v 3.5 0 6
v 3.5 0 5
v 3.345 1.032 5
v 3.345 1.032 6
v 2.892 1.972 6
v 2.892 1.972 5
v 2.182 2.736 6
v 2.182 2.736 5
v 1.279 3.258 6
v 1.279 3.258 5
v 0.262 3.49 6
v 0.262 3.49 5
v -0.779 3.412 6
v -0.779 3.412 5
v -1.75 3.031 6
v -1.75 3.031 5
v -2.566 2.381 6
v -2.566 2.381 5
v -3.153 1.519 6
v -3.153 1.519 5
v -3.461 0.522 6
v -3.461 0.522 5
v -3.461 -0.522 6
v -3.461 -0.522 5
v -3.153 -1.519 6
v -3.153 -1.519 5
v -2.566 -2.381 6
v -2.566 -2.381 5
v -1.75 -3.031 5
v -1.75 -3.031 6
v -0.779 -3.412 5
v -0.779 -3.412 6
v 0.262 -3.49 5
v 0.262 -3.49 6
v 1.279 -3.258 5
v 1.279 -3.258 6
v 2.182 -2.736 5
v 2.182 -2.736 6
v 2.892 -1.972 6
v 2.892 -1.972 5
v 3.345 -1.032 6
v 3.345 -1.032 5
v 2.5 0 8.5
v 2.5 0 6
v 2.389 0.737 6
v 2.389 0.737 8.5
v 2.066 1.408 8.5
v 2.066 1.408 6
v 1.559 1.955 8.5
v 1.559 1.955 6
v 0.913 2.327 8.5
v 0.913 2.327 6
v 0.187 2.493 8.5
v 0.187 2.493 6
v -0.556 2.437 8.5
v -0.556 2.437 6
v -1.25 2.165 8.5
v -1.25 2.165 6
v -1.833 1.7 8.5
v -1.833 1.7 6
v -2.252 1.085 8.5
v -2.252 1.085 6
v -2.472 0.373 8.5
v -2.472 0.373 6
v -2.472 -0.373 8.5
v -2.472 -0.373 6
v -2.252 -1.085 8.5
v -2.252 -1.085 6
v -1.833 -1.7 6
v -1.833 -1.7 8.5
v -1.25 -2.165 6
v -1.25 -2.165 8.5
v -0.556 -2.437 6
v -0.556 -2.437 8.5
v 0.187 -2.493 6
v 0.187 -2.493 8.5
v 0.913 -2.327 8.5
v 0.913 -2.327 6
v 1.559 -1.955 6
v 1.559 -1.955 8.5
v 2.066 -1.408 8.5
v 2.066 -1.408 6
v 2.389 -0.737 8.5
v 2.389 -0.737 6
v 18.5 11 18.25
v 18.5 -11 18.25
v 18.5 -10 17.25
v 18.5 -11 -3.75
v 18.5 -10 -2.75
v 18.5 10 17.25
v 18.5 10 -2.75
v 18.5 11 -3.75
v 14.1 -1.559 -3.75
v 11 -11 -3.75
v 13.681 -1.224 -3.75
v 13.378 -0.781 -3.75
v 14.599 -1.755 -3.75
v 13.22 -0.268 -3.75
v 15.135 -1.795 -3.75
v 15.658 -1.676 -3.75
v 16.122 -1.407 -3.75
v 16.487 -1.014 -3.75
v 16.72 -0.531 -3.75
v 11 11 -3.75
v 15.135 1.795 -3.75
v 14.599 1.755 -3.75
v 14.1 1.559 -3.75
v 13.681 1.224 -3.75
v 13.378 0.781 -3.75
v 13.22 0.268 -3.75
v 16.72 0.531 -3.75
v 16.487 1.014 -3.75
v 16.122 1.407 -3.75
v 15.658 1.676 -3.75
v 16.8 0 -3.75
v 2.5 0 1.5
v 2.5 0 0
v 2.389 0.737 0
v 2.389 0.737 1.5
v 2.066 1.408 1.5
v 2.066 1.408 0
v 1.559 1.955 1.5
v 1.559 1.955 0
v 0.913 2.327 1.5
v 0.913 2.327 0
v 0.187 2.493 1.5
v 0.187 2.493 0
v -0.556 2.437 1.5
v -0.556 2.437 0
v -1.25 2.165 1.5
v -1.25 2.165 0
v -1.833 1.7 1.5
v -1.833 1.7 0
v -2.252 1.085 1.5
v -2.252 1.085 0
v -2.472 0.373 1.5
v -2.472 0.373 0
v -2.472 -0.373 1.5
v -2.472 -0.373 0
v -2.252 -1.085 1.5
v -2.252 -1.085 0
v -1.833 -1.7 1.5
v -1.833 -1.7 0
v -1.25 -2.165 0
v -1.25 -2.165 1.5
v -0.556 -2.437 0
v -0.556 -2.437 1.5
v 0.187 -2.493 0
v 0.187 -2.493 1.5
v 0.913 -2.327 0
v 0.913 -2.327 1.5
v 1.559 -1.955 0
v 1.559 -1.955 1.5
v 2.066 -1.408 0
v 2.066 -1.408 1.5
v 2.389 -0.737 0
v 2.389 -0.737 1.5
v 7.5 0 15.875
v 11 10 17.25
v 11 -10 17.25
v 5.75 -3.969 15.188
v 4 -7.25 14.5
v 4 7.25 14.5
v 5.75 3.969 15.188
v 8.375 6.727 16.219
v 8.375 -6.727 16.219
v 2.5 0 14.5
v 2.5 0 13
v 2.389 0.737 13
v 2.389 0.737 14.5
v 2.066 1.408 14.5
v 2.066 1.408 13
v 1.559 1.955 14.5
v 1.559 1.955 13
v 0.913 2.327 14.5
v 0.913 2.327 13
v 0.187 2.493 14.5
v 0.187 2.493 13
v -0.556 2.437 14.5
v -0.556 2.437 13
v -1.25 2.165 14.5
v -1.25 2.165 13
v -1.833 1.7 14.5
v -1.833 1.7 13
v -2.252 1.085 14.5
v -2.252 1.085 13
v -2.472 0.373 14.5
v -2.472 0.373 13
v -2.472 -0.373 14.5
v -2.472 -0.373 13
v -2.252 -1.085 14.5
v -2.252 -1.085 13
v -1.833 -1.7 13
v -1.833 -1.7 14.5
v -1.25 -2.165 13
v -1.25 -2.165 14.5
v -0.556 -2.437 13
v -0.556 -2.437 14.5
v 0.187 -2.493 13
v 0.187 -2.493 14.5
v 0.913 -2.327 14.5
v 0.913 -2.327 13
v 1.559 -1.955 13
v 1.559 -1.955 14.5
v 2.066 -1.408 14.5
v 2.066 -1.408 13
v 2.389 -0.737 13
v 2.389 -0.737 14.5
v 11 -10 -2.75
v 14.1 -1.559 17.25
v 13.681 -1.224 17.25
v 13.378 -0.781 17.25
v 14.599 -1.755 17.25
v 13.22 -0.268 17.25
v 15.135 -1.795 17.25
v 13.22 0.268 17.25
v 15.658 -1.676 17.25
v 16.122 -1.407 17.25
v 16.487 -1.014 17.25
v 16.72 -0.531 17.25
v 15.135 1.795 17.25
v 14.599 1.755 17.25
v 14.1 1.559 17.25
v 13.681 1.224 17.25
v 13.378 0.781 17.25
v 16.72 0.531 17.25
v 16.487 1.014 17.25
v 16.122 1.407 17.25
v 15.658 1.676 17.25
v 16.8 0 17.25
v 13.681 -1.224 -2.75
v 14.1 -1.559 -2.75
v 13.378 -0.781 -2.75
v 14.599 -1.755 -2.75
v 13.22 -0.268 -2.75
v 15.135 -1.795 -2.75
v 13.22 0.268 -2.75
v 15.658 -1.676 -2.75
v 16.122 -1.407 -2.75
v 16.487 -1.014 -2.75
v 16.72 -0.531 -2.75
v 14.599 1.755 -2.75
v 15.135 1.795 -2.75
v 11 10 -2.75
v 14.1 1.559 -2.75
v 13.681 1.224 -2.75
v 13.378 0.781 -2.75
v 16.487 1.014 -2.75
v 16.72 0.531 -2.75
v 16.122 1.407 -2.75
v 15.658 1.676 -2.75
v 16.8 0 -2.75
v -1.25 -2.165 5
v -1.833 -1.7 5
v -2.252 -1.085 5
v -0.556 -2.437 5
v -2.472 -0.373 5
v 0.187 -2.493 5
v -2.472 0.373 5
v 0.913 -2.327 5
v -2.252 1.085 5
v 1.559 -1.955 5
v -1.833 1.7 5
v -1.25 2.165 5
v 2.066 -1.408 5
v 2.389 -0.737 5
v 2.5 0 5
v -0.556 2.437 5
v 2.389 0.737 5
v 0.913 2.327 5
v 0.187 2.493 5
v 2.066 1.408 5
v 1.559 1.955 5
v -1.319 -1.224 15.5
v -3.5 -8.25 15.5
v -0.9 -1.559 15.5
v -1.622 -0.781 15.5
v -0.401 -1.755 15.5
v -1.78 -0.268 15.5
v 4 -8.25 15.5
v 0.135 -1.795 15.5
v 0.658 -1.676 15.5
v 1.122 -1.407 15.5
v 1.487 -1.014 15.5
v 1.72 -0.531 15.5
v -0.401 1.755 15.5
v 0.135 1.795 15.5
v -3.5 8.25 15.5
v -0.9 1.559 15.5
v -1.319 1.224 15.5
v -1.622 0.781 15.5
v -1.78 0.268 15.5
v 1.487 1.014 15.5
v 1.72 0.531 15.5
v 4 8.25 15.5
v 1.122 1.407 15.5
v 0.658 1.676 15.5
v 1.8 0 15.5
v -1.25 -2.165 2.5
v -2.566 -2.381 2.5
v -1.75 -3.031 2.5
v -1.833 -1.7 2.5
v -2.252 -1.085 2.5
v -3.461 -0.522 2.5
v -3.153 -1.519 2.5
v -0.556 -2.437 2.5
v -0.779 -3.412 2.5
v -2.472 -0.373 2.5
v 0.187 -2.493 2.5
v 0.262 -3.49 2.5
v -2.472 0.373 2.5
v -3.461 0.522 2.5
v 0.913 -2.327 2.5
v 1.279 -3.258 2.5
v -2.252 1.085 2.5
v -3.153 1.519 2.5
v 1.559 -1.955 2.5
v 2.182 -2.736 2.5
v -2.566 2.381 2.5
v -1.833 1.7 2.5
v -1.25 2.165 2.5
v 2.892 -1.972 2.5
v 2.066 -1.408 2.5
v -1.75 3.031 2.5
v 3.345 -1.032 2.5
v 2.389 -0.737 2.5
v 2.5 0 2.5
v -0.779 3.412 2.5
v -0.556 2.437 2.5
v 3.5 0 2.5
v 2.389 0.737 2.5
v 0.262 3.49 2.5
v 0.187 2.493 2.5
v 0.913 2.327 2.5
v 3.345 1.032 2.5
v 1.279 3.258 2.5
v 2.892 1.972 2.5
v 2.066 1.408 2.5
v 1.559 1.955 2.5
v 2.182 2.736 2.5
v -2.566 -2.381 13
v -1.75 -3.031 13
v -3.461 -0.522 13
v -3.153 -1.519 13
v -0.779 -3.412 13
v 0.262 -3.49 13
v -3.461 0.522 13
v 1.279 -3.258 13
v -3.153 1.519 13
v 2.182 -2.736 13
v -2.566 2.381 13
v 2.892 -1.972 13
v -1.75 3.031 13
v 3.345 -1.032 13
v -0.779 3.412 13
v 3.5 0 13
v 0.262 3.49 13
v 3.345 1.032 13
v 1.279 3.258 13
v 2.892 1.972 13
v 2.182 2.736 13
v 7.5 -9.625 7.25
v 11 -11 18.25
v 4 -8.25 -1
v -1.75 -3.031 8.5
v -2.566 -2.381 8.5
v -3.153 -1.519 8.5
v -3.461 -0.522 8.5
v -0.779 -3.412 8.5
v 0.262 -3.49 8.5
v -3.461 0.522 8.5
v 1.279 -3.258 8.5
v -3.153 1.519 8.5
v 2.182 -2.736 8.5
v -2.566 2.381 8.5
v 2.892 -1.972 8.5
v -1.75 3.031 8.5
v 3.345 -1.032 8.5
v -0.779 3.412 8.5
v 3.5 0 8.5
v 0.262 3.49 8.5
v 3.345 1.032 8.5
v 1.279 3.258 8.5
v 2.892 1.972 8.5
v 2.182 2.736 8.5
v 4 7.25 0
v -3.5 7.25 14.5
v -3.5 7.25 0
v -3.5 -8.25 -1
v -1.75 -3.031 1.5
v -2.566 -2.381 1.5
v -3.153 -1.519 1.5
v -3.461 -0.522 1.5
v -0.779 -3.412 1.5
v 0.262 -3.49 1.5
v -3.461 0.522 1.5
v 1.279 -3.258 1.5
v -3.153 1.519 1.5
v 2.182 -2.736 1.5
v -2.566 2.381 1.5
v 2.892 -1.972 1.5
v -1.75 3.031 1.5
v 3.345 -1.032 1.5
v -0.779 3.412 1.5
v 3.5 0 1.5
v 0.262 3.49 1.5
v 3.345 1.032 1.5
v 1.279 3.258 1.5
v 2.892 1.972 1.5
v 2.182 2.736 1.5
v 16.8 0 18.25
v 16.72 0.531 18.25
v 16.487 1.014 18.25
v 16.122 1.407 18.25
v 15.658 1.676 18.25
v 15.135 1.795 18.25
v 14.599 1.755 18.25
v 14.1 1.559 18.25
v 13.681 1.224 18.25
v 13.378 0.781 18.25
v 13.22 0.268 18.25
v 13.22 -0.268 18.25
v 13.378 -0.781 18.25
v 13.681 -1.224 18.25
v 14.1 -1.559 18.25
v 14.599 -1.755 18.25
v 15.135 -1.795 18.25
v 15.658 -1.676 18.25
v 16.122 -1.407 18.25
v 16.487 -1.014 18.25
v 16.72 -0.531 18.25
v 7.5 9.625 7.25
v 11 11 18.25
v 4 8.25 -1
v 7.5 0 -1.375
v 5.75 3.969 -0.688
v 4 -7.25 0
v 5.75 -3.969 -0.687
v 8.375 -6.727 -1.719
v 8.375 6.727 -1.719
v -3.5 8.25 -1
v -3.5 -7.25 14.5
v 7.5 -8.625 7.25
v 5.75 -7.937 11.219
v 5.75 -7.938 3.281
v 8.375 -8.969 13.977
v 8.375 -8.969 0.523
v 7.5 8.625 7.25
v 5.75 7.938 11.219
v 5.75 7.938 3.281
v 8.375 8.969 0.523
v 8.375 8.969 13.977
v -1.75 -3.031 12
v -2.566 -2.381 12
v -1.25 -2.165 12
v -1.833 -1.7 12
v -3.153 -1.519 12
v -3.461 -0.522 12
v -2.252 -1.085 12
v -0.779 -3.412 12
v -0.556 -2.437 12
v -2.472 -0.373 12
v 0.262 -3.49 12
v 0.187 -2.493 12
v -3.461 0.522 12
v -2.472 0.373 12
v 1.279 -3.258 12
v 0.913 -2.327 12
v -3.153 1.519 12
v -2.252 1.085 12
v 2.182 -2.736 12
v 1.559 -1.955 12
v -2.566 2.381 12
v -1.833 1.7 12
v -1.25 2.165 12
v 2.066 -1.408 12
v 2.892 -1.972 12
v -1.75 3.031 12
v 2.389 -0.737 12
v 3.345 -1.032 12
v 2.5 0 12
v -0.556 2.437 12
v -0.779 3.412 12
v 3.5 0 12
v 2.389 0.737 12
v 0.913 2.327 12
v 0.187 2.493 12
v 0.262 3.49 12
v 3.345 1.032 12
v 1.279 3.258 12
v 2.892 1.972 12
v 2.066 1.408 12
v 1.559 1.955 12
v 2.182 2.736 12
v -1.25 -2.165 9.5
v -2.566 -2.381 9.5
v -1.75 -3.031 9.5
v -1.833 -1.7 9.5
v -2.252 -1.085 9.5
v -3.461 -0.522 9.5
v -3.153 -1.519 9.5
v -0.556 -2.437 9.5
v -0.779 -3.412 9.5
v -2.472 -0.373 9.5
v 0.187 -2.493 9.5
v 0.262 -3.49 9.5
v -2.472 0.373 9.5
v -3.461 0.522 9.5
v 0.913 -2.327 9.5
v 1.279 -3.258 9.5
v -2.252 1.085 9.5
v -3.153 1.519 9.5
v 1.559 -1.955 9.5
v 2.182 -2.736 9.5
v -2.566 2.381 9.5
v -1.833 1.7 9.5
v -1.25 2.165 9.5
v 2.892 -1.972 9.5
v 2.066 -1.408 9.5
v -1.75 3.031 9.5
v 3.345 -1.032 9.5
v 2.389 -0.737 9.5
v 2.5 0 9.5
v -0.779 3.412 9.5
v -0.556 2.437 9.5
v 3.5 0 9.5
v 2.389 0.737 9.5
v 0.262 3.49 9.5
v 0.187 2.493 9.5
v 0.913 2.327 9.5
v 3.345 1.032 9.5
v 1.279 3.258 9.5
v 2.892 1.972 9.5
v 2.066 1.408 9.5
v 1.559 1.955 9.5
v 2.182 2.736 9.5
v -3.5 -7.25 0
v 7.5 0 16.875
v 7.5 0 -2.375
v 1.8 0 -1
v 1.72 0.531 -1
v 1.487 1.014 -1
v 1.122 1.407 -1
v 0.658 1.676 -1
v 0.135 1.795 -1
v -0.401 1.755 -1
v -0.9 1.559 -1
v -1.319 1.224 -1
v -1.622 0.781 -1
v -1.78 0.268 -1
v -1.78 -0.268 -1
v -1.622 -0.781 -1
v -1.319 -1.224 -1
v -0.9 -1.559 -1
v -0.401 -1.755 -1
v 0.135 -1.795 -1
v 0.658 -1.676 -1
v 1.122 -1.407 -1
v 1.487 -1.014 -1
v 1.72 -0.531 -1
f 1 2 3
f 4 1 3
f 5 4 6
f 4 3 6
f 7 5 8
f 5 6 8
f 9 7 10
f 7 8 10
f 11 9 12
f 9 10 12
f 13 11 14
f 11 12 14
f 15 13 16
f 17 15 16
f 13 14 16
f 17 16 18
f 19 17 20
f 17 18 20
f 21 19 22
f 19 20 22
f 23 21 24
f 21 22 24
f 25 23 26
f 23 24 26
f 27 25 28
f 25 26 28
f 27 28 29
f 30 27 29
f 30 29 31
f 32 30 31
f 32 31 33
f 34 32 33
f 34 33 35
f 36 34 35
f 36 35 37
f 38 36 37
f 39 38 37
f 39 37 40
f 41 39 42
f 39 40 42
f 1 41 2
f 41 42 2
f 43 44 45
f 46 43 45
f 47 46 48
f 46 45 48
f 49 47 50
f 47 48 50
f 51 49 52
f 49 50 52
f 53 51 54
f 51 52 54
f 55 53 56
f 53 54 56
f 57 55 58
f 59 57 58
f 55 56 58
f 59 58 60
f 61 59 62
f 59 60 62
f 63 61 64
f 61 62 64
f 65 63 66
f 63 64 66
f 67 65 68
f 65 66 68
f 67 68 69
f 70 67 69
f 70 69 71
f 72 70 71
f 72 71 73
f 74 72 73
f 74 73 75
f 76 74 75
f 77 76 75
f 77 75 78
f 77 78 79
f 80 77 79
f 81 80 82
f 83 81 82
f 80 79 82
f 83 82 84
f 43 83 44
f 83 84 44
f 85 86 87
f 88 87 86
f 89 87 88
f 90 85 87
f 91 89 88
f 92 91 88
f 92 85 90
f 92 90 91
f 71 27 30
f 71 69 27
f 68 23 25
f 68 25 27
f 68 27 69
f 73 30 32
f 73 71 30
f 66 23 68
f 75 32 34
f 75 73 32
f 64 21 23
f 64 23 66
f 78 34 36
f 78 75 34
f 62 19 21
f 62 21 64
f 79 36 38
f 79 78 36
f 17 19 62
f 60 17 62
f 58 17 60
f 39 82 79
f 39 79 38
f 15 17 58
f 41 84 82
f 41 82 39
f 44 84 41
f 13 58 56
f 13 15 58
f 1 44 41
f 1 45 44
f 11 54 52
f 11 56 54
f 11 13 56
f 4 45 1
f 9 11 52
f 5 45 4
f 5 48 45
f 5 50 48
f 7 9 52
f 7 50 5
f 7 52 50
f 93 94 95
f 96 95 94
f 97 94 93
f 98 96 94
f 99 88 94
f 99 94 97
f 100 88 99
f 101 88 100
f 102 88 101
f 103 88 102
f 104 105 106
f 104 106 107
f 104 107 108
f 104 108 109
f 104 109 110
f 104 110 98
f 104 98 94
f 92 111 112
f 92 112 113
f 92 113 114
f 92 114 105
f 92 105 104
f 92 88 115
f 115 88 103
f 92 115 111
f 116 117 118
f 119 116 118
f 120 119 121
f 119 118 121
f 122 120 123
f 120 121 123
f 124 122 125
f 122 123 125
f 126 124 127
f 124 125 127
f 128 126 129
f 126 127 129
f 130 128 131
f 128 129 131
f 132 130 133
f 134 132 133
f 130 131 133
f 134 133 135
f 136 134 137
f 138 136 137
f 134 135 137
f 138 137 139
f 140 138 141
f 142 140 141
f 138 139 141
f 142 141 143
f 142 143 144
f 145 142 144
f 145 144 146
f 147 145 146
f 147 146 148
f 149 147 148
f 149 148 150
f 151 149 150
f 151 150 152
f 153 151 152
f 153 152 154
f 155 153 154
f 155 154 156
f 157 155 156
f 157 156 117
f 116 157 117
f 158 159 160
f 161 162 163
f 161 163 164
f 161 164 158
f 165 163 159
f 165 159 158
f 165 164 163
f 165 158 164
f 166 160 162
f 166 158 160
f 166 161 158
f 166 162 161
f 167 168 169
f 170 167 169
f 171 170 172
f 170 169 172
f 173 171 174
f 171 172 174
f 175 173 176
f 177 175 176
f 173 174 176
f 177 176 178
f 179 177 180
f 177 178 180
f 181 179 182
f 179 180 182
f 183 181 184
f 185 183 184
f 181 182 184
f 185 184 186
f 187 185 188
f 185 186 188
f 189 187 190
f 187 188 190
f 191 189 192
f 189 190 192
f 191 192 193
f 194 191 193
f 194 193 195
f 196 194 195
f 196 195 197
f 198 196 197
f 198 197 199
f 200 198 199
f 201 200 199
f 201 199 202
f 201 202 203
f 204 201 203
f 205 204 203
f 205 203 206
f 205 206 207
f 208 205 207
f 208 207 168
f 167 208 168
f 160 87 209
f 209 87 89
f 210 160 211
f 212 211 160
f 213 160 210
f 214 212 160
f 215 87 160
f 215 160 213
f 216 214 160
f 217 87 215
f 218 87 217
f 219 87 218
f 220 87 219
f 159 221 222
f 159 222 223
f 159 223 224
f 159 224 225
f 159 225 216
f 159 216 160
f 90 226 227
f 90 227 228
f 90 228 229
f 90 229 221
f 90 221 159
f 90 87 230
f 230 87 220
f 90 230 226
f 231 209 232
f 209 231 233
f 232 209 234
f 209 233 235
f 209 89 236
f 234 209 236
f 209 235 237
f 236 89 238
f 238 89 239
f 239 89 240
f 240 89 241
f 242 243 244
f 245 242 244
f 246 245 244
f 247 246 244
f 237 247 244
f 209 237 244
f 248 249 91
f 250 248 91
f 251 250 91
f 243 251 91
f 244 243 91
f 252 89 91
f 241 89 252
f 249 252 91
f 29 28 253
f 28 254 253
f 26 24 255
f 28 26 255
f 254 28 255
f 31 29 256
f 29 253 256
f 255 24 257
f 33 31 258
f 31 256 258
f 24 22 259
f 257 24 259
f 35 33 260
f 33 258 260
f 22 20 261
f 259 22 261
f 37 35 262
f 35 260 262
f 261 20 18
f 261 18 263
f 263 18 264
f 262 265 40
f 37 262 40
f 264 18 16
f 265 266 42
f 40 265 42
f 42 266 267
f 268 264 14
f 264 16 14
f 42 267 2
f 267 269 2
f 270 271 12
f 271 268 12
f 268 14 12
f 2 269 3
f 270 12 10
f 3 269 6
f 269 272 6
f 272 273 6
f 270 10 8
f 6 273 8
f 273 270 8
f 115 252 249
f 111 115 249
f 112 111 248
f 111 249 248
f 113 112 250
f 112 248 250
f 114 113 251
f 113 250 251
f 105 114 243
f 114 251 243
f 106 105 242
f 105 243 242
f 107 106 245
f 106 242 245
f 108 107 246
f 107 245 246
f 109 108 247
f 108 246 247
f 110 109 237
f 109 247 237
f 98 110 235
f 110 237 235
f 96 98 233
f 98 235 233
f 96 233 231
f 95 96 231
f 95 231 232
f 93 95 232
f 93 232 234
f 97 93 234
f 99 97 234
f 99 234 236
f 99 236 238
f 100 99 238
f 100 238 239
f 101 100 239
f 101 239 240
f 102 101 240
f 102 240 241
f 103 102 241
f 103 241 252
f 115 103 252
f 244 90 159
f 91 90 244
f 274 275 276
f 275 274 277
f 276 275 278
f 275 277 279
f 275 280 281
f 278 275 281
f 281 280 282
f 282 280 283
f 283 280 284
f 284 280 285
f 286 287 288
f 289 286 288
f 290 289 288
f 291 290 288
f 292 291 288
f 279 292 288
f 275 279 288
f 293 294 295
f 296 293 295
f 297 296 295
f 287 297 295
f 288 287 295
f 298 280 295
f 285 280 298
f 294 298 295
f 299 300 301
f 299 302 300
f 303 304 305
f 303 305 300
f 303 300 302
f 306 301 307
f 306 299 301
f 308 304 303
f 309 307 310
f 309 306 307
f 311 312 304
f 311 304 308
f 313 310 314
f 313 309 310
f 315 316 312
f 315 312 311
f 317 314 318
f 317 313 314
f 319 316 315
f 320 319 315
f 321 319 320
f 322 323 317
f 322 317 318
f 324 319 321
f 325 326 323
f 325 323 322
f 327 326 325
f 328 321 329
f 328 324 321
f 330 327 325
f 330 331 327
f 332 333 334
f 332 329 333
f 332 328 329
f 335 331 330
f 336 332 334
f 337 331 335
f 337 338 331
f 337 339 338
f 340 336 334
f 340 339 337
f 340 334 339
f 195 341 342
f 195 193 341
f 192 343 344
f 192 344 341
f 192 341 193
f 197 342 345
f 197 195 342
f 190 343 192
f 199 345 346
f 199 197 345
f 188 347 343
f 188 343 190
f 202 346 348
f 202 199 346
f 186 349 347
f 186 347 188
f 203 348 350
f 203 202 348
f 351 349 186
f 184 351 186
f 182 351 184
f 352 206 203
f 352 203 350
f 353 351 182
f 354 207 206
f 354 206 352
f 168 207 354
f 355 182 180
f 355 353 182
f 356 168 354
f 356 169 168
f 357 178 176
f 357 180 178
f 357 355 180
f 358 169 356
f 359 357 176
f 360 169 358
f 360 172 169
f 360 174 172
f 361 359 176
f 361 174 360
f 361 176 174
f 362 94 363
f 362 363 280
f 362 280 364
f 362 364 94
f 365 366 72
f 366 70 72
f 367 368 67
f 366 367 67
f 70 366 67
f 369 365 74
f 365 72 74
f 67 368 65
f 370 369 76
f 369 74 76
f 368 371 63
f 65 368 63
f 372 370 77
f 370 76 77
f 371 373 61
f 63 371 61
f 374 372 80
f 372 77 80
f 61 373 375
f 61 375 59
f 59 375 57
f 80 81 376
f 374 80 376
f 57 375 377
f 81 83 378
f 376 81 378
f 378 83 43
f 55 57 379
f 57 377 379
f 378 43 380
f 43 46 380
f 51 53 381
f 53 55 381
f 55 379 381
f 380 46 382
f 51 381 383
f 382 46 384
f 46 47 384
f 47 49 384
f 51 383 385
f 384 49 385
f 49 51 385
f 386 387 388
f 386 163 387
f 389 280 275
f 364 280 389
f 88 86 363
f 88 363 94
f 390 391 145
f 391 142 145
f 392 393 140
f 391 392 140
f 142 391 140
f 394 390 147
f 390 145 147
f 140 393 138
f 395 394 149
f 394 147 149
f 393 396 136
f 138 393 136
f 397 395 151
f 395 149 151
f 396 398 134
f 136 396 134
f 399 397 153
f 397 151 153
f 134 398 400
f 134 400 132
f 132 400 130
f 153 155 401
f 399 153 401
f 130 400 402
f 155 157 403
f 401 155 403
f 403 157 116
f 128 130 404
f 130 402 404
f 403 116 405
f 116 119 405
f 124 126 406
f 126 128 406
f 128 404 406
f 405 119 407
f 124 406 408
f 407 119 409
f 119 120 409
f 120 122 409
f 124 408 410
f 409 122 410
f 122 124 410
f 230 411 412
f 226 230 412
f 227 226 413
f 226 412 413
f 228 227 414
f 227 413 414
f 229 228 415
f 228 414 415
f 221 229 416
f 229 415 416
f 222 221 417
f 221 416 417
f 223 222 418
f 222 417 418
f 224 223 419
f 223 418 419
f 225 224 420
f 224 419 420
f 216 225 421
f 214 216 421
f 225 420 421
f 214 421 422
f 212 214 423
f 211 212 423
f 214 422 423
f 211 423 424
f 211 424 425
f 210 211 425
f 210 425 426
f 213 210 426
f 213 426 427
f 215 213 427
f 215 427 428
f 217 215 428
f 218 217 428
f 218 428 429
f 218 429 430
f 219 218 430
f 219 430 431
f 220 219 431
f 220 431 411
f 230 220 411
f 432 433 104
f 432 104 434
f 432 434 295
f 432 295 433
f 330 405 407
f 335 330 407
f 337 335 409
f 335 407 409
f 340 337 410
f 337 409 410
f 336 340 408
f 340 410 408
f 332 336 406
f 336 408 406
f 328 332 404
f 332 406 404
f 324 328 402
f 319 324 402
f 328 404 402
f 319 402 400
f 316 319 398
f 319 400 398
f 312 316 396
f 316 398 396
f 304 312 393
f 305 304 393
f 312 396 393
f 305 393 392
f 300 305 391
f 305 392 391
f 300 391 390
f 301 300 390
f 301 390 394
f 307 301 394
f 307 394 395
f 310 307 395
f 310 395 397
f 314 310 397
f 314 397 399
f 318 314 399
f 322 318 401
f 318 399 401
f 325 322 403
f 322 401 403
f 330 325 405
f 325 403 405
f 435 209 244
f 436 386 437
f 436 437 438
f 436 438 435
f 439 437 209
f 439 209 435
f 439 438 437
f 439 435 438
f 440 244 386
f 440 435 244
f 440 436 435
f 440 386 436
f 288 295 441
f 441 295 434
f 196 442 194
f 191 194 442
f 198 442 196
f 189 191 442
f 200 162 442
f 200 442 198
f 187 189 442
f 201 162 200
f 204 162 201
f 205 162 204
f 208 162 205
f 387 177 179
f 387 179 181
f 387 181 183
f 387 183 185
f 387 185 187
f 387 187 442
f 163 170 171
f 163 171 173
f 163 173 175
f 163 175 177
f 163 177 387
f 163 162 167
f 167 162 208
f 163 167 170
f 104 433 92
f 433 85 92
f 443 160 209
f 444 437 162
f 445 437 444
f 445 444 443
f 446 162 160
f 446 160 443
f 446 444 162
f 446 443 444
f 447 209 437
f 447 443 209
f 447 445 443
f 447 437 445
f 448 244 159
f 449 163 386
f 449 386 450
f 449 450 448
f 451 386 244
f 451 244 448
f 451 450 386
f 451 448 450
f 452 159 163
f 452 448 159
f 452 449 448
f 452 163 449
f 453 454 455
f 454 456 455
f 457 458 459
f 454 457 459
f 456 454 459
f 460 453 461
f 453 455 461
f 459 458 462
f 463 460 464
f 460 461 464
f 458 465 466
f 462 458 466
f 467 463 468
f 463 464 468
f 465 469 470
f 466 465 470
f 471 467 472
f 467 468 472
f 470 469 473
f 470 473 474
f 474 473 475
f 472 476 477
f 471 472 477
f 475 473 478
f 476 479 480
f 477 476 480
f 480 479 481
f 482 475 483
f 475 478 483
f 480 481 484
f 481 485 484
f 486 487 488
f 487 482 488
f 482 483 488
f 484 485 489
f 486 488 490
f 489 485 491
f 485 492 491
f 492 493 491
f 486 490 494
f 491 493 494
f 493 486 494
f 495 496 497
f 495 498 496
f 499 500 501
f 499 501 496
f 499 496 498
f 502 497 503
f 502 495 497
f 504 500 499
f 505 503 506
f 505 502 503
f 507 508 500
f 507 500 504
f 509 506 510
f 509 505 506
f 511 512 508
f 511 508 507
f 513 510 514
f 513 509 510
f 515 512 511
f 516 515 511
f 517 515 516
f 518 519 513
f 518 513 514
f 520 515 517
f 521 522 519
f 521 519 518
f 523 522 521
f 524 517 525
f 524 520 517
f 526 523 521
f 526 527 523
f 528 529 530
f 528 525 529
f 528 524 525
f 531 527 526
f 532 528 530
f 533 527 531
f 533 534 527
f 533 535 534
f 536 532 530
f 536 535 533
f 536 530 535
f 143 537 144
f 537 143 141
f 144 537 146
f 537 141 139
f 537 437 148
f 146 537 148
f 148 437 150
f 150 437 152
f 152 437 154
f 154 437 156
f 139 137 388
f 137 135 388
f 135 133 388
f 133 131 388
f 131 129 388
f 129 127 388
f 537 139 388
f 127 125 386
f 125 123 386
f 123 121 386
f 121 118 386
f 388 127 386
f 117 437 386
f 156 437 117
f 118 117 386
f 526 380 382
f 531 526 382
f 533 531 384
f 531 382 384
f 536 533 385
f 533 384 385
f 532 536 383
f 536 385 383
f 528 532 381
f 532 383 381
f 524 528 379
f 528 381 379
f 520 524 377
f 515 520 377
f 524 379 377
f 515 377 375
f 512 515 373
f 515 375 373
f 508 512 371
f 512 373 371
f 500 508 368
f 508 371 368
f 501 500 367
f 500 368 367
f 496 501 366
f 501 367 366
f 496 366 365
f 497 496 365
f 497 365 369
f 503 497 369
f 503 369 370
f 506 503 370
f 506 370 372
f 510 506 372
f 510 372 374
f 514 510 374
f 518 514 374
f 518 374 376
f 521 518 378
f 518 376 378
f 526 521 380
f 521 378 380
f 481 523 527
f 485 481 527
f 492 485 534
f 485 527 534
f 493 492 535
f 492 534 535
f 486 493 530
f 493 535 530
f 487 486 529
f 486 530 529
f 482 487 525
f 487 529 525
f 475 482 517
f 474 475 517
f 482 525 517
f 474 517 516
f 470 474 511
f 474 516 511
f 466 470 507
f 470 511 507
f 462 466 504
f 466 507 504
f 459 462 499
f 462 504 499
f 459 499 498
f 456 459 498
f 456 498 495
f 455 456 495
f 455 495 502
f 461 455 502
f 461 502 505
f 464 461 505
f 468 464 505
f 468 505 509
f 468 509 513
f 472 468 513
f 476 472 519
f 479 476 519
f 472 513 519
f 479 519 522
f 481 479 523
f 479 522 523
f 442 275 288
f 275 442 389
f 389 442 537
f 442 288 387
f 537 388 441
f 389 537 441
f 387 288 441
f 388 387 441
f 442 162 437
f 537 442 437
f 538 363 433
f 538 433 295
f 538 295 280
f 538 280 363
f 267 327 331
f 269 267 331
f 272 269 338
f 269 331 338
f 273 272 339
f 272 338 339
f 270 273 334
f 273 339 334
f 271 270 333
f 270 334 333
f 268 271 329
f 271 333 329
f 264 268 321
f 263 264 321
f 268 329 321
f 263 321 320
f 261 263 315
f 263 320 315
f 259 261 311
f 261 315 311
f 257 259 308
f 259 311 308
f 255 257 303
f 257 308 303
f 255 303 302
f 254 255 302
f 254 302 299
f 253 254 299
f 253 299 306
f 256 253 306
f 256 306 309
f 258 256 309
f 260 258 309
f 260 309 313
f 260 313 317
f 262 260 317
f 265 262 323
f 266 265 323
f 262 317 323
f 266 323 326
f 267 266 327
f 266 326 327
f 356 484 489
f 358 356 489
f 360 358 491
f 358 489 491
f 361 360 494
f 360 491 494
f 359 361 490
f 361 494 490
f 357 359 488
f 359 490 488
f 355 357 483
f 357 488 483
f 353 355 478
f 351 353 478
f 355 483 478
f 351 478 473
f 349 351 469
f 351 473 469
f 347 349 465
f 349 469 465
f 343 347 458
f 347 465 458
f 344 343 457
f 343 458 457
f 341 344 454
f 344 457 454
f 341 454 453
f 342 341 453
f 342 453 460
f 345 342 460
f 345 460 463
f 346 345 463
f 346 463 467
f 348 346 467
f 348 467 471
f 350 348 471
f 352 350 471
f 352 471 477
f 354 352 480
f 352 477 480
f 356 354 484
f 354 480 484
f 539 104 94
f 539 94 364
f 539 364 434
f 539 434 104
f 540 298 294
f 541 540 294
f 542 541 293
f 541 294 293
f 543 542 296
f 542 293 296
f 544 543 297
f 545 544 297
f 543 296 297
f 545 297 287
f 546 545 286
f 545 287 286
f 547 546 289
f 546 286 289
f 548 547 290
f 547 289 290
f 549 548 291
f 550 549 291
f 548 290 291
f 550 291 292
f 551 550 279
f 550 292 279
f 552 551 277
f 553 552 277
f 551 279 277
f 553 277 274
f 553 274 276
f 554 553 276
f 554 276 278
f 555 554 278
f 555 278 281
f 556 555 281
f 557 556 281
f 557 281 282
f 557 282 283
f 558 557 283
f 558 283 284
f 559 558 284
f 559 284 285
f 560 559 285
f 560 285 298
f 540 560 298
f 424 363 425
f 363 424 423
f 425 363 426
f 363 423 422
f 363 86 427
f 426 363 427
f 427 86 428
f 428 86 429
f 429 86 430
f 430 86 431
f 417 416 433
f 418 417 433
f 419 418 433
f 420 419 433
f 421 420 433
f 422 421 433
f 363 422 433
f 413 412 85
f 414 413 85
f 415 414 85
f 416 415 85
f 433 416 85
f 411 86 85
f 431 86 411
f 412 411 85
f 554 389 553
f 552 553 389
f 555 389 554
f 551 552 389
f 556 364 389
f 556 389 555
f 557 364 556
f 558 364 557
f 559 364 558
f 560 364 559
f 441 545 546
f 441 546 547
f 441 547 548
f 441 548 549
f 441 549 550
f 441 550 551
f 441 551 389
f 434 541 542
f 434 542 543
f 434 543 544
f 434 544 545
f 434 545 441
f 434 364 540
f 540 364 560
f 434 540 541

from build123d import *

# Parameters (mm, degrees)
SKETCH_1_R               = 2.5
EXTRUDE_1_DEPTH          = 1.5
SKETCH_2_R               = 3.5
EXTRUDE_2_DEPTH          = 1
SKETCH_3_R               = 2.5
EXTRUDE_3_DEPTH          = 2.5
SKETCH_4_R               = 3.5
EXTRUDE_4_DEPTH          = 1
SKETCH_5_R               = 2.5
EXTRUDE_5_DEPTH          = 2.5
SKETCH_6_R               = 3.5
EXTRUDE_6_DEPTH          = 1
SKETCH_7_R               = 2.5
EXTRUDE_7_DEPTH          = 2.5
SKETCH_10_R              = 3.5
EXTRUDE_9_DEPTH          = 1
SKETCH_11_R              = 2.5
EXTRUDE_10_DEPTH         = 1.5
SKETCH_12_R              = 1.8
CUT_EXTRUDE_2_DEPTH      = 15.5
SKETCH_13_W              = 22
SKETCH_13_H              = 22
SKETCH_13_W_2            = 20
SKETCH_13_H_2            = 20
EXTRUDE_11_DEPTH         = 3.5
EXTRUDE_11_DEPTH_BACK    = 4
SKETCH_14_W              = 16.5
SKETCH_14_H              = 16.5
SKETCH_14_W_2            = 14.5
SKETCH_14_H_2            = 14.5
EXTRUDE_12_DEPTH         = 4
EXTRUDE_12_DEPTH_BACK    = 3.5
PATTERN_CIRCULAR_1_COUNT = 4
SKETCH_19_R              = 1.8
CUT_EXTRUDE_3_DEPTH      = 20.2500001
SKETCH_20_R              = 1.8
CUT_EXTRUDE_4_DEPTH      = 23.0000001


with BuildPart() as part:
    # ｽｹｯﾁ1 → ﾎﾞｽ - 押し出し1 (new body)
    with BuildSketch(Plane.XY):
        Circle(SKETCH_1_R)
    extrude(amount=EXTRUDE_1_DEPTH)

    # ｽｹｯﾁ2 → ﾎﾞｽ - 押し出し2 (add)
    with BuildSketch(Plane.XY.offset(1.5)):
        Circle(SKETCH_2_R)
    extrude(amount=EXTRUDE_2_DEPTH)

    # ｽｹｯﾁ3 → ﾎﾞｽ - 押し出し3 (add)
    with BuildSketch(Plane.XY.offset(2.5)):
        Circle(SKETCH_3_R)
    extrude(amount=EXTRUDE_3_DEPTH)

    # ｽｹｯﾁ4 → ﾎﾞｽ - 押し出し4 (add)
    with BuildSketch(Plane.XY.offset(5)):
        Circle(SKETCH_4_R)
    extrude(amount=EXTRUDE_4_DEPTH)

    # ｽｹｯﾁ5 → ﾎﾞｽ - 押し出し5 (add)
    with BuildSketch(Plane.XY.offset(6)):
        Circle(SKETCH_5_R)
    extrude(amount=EXTRUDE_5_DEPTH)

    # ｽｹｯﾁ6 → ﾎﾞｽ - 押し出し6 (add)
    with BuildSketch(Plane.XY.offset(8.5)):
        Circle(SKETCH_6_R)
    extrude(amount=EXTRUDE_6_DEPTH)

    # ｽｹｯﾁ7 → ﾎﾞｽ - 押し出し7 (add)
    with BuildSketch(Plane.XY.offset(9.5)):
        Circle(SKETCH_7_R)
    extrude(amount=EXTRUDE_7_DEPTH)

    # ｽｹｯﾁ10 → ﾎﾞｽ - 押し出し9 (add)
    with BuildSketch(Plane.XY.offset(12)):
        Circle(SKETCH_10_R)
    extrude(amount=EXTRUDE_9_DEPTH)

    # ｽｹｯﾁ11 → ﾎﾞｽ - 押し出し10 (add)
    with BuildSketch(Plane.XY.offset(13)):
        Circle(SKETCH_11_R)
    extrude(amount=EXTRUDE_10_DEPTH)

    # ｽｹｯﾁ12 → ｶｯﾄ - 押し出し2 (cut, through all)
    with BuildSketch(Plane.XY.offset(14.5)):
        Circle(SKETCH_12_R)
    extrude(amount=-CUT_EXTRUDE_2_DEPTH, mode=Mode.SUBTRACT)

    # ｽｹｯﾁ14 → ﾎﾞｽ - 押し出し12 (add, two sides)
    with BuildSketch(Plane(origin=(0, 0, 0), x_dir=(0, 0, -1), z_dir=(1, 0, 0))) as extrude_12_sk:
        with Locations((-7.25, 0)):
            Rectangle(SKETCH_14_W, SKETCH_14_H)
        with Locations((-7.25, 0)):
            Rectangle(SKETCH_14_W_2, SKETCH_14_H_2, mode=Mode.SUBTRACT)
    extrude(amount=EXTRUDE_12_DEPTH)
    extrude(extrude_12_sk.sketch, amount=-EXTRUDE_12_DEPTH_BACK)



with BuildPart() as body_2:
    # ｽｹｯﾁ13 → ﾎﾞｽ - 押し出し11 (new body, two sides)
    with BuildSketch(Plane(origin=(15, 0, 0), x_dir=(0, 0, -1), z_dir=(1, 0, 0))) as extrude_11_sk:
        with Locations((-7.25, 0)):
            Rectangle(SKETCH_13_W, SKETCH_13_H)
        with Locations((-7.25, 0)):
            Rectangle(SKETCH_13_W_2, SKETCH_13_H_2, mode=Mode.SUBTRACT)
    extrude(amount=EXTRUDE_11_DEPTH)
    extrude(extrude_11_sk.sketch, amount=-EXTRUDE_11_DEPTH_BACK)


with BuildPart() as part_1:
    add(part.part)

    add(body_2.part)  # ﾛﾌﾄ2 merges body 2
    # ｽｹｯﾁ16 → ﾛﾌﾄ2 section 0
    with BuildSketch(Plane.ZY.offset(-11)):
        Polygon((-3.75, 11), (-2.75, 10), (17.25, 10), (18.25, 11), align=None)
    # ｽｹｯﾁ17 → ﾛﾌﾄ2 section 1
    with BuildSketch(Plane(origin=(4, 0, 0), x_dir=(0, 0, -1), z_dir=(1, 0, 0))):
        Polygon((-15.5, 8.25), (-14.5, 7.25), (0, 7.25), (1, 8.25), align=None)
    loft_2 = loft()

    # 円形ﾊﾟﾀｰﾝ1: ﾛﾌﾄ2 ×4 about axis
    pattern_circular_1_axis = Axis((0, 0, 7.25), (1, 0, 0))
    for i in range(1, PATTERN_CIRCULAR_1_COUNT):
        add(loft_2.rotate(pattern_circular_1_axis, i * 360 / PATTERN_CIRCULAR_1_COUNT))

    # ｽｹｯﾁ19 → ｶｯﾄ - 押し出し3 (cut, through all)
    with BuildSketch(Plane.XY.offset(15.5)):
        Circle(SKETCH_19_R)
    extrude(amount=-CUT_EXTRUDE_3_DEPTH, mode=Mode.SUBTRACT)

    # ｽｹｯﾁ20 → ｶｯﾄ - 押し出し4 (cut, through all)
    with BuildSketch(Plane.XY.offset(18.25)):
        with Locations((15, 0)):
            Circle(SKETCH_20_R)
    extrude(amount=-CUT_EXTRUDE_4_DEPTH, mode=Mode.SUBTRACT)


solid = part_1.part
